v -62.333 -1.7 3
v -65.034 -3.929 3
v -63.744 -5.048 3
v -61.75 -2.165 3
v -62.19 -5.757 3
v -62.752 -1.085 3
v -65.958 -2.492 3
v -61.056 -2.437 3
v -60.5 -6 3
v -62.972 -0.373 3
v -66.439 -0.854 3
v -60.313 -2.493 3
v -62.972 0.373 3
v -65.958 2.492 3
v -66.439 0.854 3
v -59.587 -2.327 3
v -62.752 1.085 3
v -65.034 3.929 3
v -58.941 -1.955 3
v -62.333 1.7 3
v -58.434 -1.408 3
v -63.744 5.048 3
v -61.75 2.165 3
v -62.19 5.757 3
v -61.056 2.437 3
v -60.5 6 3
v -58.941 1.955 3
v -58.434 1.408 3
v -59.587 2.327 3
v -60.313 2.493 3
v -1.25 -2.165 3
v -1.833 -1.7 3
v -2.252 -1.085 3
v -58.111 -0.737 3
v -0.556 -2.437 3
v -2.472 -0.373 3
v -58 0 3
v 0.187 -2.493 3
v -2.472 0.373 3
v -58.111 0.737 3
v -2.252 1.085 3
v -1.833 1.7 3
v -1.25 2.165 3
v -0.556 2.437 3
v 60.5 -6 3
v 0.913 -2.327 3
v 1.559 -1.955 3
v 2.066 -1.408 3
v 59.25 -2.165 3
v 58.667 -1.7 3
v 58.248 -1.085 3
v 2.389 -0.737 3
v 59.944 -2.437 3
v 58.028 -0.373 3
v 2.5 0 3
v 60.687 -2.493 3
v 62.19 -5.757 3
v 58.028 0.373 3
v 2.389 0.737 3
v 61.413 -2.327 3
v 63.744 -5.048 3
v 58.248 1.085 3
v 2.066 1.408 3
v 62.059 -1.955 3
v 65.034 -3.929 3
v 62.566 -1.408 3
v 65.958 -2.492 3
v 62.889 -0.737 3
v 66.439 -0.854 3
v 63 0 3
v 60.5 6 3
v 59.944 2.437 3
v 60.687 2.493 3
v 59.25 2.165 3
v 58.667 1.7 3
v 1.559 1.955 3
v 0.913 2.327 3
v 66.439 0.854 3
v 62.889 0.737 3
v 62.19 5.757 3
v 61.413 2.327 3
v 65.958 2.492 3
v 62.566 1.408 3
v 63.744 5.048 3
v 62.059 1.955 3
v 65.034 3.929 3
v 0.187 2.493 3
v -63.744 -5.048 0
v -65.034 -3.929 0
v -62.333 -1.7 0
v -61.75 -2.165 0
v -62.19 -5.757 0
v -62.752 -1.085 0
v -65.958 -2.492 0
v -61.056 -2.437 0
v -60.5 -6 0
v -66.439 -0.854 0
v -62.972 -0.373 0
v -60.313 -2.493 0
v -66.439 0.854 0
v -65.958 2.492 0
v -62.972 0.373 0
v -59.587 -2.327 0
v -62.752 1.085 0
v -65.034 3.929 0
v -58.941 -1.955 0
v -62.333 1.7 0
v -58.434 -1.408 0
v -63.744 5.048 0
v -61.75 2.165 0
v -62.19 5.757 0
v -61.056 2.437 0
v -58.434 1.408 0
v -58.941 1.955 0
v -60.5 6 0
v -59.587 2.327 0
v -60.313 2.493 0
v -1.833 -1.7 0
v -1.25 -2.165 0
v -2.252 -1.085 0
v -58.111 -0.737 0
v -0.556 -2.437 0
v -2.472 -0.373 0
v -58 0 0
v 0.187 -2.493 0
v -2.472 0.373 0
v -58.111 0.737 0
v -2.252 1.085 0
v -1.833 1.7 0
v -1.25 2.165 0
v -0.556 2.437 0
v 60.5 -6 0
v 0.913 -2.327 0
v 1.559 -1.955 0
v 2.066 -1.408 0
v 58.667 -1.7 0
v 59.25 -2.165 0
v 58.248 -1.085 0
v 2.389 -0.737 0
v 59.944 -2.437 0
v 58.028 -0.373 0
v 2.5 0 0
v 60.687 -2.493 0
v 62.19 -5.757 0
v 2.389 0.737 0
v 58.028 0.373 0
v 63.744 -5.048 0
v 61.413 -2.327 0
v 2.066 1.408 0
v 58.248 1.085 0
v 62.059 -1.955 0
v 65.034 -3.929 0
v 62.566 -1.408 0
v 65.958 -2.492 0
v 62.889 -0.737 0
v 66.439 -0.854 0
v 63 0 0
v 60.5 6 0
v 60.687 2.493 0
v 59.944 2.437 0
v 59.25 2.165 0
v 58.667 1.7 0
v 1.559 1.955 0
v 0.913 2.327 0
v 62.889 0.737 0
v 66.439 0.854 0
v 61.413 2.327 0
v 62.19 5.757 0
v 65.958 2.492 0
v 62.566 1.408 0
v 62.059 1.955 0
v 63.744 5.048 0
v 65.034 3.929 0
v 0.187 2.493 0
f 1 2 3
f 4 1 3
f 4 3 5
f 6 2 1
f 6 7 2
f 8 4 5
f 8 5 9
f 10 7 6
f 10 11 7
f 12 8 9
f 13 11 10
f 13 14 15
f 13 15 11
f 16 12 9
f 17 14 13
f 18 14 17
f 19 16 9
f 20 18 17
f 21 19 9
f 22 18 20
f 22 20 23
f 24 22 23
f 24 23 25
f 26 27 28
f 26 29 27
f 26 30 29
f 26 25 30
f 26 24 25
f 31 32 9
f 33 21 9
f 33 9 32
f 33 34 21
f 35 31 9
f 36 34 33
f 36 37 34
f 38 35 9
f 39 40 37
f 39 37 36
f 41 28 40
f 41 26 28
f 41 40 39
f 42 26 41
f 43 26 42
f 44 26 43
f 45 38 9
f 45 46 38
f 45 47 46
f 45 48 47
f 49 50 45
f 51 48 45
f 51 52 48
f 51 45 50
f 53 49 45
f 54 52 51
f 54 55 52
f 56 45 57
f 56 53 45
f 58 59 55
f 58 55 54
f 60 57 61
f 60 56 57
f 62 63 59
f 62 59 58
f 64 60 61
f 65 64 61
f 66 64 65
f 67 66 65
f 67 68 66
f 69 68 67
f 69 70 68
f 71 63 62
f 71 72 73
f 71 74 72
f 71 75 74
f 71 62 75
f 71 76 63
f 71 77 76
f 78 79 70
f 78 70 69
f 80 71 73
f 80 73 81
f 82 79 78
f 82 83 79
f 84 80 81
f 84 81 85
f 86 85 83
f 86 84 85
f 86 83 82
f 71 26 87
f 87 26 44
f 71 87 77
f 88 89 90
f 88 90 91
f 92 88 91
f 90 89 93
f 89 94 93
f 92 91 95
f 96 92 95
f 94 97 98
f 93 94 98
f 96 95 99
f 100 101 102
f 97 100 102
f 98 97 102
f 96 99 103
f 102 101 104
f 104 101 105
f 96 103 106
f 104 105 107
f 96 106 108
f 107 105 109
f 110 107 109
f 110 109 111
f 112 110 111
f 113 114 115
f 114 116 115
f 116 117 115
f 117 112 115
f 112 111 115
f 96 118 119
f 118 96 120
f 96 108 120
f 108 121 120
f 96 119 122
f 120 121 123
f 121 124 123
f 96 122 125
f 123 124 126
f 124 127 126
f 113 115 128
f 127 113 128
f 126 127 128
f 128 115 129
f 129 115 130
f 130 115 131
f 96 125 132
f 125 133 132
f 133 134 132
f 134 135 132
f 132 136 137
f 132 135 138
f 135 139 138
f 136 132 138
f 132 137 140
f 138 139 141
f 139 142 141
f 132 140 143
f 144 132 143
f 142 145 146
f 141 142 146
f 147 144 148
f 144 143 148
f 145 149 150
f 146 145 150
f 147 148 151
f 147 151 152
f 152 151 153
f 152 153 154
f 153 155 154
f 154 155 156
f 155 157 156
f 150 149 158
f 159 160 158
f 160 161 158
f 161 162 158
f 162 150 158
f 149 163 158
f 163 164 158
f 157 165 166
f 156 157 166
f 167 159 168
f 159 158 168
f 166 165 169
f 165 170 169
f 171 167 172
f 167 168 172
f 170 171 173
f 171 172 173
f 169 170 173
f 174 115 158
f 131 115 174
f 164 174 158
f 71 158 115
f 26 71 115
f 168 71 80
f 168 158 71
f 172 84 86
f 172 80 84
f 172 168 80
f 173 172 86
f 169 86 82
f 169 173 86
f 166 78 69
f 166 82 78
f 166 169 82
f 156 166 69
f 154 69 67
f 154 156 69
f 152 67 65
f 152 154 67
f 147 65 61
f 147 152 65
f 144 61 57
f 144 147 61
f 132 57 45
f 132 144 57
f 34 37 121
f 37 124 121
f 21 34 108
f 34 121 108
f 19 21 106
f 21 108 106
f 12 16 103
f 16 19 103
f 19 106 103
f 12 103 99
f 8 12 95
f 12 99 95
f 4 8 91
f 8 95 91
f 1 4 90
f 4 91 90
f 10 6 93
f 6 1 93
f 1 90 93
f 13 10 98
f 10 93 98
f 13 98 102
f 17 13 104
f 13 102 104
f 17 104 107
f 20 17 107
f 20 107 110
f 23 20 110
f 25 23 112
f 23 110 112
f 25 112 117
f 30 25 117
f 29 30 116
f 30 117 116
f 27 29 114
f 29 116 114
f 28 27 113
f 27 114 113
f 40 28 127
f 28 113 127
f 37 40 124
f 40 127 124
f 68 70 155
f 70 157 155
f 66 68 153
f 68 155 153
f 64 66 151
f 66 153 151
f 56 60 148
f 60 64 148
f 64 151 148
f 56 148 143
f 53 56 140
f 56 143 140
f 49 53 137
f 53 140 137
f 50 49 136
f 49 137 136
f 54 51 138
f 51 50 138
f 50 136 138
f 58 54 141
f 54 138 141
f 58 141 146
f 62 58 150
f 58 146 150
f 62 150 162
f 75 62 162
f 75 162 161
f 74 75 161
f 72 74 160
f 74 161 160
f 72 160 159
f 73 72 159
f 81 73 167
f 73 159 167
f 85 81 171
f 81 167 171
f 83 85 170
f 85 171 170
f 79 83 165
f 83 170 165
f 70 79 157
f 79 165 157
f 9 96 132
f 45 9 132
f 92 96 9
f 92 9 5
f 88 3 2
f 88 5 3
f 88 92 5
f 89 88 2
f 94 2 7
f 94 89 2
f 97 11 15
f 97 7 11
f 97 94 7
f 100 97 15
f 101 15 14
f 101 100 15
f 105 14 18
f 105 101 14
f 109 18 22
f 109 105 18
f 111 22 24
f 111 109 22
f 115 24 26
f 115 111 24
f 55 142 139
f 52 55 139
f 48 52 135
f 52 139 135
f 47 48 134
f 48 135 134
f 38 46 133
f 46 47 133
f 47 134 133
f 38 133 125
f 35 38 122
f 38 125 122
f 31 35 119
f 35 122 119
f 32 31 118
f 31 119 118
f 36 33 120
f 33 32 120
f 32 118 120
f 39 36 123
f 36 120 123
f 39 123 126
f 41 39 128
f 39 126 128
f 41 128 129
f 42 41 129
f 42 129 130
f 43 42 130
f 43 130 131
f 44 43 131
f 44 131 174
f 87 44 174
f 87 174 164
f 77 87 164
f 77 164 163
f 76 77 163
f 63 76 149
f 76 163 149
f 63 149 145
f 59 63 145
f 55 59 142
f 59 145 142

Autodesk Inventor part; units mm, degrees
ref_plane "YZ Plane" through (0, 0, 0) normal (1, 0, 0) x (0, 1, 0)
ref_plane "XZ Plane" through (0, 0, 0) normal (0, 1, 0) x (-1, 0, 0)
ref_plane "XY Plane" through (0, 0, 0) normal (0, 0, 1) x (1, 0, 0)
sketch "草圖1" plane through (0, 0, 0) normal (0, 0, 1) x (1, 0, 0)
  line L0 (-60.5, 0) -> (60.5, 0) construction
  line L1 (-60.5, -6) -> (60.5, -6)
  line L2 (60.5, 6) -> (-60.5, 6)
  arc A0 (-60.5, 6) -> (-60.5, -6) centre (-60.5, 0) ccw
  arc A1 (60.5, -6) -> (60.5, 6) centre (60.5, 0) ccw
  circle A2 centre (-60.5, 0) radius 2.5
  circle A3 centre (0, 0) radius 2.5
  circle A4 centre (60.5, 0) radius 2.5
  dimension "d0" = 121
  dimension "d1" = 12
  dimension "d2" = 5
extrude "擠出1" add sketch "草圖1" along normal blind 3
sketch "草圖2" plane through (0, 0, 3) normal (0, 0, 1) x (1, 0, 0)
  arc A0 (60.5, -6) -> (60.5, 6) centre (60.5, 0) ccw projected
  line L0 (60.5, 6) -> (-60.5, 6) projected
  arc A1 (-60.5, 6) -> (-60.5, -6) centre (-60.5, 0) ccw projected
  line L1 (-60.5, -6) -> (60.5, -6) projected
  circle A2 centre (0, 0) radius 2.5 projected
  circle A3 centre (60.5, 0) radius 2.5 projected
  circle A4 centre (-60.5, 0) radius 2.5 projected
properties part number "連桿"
